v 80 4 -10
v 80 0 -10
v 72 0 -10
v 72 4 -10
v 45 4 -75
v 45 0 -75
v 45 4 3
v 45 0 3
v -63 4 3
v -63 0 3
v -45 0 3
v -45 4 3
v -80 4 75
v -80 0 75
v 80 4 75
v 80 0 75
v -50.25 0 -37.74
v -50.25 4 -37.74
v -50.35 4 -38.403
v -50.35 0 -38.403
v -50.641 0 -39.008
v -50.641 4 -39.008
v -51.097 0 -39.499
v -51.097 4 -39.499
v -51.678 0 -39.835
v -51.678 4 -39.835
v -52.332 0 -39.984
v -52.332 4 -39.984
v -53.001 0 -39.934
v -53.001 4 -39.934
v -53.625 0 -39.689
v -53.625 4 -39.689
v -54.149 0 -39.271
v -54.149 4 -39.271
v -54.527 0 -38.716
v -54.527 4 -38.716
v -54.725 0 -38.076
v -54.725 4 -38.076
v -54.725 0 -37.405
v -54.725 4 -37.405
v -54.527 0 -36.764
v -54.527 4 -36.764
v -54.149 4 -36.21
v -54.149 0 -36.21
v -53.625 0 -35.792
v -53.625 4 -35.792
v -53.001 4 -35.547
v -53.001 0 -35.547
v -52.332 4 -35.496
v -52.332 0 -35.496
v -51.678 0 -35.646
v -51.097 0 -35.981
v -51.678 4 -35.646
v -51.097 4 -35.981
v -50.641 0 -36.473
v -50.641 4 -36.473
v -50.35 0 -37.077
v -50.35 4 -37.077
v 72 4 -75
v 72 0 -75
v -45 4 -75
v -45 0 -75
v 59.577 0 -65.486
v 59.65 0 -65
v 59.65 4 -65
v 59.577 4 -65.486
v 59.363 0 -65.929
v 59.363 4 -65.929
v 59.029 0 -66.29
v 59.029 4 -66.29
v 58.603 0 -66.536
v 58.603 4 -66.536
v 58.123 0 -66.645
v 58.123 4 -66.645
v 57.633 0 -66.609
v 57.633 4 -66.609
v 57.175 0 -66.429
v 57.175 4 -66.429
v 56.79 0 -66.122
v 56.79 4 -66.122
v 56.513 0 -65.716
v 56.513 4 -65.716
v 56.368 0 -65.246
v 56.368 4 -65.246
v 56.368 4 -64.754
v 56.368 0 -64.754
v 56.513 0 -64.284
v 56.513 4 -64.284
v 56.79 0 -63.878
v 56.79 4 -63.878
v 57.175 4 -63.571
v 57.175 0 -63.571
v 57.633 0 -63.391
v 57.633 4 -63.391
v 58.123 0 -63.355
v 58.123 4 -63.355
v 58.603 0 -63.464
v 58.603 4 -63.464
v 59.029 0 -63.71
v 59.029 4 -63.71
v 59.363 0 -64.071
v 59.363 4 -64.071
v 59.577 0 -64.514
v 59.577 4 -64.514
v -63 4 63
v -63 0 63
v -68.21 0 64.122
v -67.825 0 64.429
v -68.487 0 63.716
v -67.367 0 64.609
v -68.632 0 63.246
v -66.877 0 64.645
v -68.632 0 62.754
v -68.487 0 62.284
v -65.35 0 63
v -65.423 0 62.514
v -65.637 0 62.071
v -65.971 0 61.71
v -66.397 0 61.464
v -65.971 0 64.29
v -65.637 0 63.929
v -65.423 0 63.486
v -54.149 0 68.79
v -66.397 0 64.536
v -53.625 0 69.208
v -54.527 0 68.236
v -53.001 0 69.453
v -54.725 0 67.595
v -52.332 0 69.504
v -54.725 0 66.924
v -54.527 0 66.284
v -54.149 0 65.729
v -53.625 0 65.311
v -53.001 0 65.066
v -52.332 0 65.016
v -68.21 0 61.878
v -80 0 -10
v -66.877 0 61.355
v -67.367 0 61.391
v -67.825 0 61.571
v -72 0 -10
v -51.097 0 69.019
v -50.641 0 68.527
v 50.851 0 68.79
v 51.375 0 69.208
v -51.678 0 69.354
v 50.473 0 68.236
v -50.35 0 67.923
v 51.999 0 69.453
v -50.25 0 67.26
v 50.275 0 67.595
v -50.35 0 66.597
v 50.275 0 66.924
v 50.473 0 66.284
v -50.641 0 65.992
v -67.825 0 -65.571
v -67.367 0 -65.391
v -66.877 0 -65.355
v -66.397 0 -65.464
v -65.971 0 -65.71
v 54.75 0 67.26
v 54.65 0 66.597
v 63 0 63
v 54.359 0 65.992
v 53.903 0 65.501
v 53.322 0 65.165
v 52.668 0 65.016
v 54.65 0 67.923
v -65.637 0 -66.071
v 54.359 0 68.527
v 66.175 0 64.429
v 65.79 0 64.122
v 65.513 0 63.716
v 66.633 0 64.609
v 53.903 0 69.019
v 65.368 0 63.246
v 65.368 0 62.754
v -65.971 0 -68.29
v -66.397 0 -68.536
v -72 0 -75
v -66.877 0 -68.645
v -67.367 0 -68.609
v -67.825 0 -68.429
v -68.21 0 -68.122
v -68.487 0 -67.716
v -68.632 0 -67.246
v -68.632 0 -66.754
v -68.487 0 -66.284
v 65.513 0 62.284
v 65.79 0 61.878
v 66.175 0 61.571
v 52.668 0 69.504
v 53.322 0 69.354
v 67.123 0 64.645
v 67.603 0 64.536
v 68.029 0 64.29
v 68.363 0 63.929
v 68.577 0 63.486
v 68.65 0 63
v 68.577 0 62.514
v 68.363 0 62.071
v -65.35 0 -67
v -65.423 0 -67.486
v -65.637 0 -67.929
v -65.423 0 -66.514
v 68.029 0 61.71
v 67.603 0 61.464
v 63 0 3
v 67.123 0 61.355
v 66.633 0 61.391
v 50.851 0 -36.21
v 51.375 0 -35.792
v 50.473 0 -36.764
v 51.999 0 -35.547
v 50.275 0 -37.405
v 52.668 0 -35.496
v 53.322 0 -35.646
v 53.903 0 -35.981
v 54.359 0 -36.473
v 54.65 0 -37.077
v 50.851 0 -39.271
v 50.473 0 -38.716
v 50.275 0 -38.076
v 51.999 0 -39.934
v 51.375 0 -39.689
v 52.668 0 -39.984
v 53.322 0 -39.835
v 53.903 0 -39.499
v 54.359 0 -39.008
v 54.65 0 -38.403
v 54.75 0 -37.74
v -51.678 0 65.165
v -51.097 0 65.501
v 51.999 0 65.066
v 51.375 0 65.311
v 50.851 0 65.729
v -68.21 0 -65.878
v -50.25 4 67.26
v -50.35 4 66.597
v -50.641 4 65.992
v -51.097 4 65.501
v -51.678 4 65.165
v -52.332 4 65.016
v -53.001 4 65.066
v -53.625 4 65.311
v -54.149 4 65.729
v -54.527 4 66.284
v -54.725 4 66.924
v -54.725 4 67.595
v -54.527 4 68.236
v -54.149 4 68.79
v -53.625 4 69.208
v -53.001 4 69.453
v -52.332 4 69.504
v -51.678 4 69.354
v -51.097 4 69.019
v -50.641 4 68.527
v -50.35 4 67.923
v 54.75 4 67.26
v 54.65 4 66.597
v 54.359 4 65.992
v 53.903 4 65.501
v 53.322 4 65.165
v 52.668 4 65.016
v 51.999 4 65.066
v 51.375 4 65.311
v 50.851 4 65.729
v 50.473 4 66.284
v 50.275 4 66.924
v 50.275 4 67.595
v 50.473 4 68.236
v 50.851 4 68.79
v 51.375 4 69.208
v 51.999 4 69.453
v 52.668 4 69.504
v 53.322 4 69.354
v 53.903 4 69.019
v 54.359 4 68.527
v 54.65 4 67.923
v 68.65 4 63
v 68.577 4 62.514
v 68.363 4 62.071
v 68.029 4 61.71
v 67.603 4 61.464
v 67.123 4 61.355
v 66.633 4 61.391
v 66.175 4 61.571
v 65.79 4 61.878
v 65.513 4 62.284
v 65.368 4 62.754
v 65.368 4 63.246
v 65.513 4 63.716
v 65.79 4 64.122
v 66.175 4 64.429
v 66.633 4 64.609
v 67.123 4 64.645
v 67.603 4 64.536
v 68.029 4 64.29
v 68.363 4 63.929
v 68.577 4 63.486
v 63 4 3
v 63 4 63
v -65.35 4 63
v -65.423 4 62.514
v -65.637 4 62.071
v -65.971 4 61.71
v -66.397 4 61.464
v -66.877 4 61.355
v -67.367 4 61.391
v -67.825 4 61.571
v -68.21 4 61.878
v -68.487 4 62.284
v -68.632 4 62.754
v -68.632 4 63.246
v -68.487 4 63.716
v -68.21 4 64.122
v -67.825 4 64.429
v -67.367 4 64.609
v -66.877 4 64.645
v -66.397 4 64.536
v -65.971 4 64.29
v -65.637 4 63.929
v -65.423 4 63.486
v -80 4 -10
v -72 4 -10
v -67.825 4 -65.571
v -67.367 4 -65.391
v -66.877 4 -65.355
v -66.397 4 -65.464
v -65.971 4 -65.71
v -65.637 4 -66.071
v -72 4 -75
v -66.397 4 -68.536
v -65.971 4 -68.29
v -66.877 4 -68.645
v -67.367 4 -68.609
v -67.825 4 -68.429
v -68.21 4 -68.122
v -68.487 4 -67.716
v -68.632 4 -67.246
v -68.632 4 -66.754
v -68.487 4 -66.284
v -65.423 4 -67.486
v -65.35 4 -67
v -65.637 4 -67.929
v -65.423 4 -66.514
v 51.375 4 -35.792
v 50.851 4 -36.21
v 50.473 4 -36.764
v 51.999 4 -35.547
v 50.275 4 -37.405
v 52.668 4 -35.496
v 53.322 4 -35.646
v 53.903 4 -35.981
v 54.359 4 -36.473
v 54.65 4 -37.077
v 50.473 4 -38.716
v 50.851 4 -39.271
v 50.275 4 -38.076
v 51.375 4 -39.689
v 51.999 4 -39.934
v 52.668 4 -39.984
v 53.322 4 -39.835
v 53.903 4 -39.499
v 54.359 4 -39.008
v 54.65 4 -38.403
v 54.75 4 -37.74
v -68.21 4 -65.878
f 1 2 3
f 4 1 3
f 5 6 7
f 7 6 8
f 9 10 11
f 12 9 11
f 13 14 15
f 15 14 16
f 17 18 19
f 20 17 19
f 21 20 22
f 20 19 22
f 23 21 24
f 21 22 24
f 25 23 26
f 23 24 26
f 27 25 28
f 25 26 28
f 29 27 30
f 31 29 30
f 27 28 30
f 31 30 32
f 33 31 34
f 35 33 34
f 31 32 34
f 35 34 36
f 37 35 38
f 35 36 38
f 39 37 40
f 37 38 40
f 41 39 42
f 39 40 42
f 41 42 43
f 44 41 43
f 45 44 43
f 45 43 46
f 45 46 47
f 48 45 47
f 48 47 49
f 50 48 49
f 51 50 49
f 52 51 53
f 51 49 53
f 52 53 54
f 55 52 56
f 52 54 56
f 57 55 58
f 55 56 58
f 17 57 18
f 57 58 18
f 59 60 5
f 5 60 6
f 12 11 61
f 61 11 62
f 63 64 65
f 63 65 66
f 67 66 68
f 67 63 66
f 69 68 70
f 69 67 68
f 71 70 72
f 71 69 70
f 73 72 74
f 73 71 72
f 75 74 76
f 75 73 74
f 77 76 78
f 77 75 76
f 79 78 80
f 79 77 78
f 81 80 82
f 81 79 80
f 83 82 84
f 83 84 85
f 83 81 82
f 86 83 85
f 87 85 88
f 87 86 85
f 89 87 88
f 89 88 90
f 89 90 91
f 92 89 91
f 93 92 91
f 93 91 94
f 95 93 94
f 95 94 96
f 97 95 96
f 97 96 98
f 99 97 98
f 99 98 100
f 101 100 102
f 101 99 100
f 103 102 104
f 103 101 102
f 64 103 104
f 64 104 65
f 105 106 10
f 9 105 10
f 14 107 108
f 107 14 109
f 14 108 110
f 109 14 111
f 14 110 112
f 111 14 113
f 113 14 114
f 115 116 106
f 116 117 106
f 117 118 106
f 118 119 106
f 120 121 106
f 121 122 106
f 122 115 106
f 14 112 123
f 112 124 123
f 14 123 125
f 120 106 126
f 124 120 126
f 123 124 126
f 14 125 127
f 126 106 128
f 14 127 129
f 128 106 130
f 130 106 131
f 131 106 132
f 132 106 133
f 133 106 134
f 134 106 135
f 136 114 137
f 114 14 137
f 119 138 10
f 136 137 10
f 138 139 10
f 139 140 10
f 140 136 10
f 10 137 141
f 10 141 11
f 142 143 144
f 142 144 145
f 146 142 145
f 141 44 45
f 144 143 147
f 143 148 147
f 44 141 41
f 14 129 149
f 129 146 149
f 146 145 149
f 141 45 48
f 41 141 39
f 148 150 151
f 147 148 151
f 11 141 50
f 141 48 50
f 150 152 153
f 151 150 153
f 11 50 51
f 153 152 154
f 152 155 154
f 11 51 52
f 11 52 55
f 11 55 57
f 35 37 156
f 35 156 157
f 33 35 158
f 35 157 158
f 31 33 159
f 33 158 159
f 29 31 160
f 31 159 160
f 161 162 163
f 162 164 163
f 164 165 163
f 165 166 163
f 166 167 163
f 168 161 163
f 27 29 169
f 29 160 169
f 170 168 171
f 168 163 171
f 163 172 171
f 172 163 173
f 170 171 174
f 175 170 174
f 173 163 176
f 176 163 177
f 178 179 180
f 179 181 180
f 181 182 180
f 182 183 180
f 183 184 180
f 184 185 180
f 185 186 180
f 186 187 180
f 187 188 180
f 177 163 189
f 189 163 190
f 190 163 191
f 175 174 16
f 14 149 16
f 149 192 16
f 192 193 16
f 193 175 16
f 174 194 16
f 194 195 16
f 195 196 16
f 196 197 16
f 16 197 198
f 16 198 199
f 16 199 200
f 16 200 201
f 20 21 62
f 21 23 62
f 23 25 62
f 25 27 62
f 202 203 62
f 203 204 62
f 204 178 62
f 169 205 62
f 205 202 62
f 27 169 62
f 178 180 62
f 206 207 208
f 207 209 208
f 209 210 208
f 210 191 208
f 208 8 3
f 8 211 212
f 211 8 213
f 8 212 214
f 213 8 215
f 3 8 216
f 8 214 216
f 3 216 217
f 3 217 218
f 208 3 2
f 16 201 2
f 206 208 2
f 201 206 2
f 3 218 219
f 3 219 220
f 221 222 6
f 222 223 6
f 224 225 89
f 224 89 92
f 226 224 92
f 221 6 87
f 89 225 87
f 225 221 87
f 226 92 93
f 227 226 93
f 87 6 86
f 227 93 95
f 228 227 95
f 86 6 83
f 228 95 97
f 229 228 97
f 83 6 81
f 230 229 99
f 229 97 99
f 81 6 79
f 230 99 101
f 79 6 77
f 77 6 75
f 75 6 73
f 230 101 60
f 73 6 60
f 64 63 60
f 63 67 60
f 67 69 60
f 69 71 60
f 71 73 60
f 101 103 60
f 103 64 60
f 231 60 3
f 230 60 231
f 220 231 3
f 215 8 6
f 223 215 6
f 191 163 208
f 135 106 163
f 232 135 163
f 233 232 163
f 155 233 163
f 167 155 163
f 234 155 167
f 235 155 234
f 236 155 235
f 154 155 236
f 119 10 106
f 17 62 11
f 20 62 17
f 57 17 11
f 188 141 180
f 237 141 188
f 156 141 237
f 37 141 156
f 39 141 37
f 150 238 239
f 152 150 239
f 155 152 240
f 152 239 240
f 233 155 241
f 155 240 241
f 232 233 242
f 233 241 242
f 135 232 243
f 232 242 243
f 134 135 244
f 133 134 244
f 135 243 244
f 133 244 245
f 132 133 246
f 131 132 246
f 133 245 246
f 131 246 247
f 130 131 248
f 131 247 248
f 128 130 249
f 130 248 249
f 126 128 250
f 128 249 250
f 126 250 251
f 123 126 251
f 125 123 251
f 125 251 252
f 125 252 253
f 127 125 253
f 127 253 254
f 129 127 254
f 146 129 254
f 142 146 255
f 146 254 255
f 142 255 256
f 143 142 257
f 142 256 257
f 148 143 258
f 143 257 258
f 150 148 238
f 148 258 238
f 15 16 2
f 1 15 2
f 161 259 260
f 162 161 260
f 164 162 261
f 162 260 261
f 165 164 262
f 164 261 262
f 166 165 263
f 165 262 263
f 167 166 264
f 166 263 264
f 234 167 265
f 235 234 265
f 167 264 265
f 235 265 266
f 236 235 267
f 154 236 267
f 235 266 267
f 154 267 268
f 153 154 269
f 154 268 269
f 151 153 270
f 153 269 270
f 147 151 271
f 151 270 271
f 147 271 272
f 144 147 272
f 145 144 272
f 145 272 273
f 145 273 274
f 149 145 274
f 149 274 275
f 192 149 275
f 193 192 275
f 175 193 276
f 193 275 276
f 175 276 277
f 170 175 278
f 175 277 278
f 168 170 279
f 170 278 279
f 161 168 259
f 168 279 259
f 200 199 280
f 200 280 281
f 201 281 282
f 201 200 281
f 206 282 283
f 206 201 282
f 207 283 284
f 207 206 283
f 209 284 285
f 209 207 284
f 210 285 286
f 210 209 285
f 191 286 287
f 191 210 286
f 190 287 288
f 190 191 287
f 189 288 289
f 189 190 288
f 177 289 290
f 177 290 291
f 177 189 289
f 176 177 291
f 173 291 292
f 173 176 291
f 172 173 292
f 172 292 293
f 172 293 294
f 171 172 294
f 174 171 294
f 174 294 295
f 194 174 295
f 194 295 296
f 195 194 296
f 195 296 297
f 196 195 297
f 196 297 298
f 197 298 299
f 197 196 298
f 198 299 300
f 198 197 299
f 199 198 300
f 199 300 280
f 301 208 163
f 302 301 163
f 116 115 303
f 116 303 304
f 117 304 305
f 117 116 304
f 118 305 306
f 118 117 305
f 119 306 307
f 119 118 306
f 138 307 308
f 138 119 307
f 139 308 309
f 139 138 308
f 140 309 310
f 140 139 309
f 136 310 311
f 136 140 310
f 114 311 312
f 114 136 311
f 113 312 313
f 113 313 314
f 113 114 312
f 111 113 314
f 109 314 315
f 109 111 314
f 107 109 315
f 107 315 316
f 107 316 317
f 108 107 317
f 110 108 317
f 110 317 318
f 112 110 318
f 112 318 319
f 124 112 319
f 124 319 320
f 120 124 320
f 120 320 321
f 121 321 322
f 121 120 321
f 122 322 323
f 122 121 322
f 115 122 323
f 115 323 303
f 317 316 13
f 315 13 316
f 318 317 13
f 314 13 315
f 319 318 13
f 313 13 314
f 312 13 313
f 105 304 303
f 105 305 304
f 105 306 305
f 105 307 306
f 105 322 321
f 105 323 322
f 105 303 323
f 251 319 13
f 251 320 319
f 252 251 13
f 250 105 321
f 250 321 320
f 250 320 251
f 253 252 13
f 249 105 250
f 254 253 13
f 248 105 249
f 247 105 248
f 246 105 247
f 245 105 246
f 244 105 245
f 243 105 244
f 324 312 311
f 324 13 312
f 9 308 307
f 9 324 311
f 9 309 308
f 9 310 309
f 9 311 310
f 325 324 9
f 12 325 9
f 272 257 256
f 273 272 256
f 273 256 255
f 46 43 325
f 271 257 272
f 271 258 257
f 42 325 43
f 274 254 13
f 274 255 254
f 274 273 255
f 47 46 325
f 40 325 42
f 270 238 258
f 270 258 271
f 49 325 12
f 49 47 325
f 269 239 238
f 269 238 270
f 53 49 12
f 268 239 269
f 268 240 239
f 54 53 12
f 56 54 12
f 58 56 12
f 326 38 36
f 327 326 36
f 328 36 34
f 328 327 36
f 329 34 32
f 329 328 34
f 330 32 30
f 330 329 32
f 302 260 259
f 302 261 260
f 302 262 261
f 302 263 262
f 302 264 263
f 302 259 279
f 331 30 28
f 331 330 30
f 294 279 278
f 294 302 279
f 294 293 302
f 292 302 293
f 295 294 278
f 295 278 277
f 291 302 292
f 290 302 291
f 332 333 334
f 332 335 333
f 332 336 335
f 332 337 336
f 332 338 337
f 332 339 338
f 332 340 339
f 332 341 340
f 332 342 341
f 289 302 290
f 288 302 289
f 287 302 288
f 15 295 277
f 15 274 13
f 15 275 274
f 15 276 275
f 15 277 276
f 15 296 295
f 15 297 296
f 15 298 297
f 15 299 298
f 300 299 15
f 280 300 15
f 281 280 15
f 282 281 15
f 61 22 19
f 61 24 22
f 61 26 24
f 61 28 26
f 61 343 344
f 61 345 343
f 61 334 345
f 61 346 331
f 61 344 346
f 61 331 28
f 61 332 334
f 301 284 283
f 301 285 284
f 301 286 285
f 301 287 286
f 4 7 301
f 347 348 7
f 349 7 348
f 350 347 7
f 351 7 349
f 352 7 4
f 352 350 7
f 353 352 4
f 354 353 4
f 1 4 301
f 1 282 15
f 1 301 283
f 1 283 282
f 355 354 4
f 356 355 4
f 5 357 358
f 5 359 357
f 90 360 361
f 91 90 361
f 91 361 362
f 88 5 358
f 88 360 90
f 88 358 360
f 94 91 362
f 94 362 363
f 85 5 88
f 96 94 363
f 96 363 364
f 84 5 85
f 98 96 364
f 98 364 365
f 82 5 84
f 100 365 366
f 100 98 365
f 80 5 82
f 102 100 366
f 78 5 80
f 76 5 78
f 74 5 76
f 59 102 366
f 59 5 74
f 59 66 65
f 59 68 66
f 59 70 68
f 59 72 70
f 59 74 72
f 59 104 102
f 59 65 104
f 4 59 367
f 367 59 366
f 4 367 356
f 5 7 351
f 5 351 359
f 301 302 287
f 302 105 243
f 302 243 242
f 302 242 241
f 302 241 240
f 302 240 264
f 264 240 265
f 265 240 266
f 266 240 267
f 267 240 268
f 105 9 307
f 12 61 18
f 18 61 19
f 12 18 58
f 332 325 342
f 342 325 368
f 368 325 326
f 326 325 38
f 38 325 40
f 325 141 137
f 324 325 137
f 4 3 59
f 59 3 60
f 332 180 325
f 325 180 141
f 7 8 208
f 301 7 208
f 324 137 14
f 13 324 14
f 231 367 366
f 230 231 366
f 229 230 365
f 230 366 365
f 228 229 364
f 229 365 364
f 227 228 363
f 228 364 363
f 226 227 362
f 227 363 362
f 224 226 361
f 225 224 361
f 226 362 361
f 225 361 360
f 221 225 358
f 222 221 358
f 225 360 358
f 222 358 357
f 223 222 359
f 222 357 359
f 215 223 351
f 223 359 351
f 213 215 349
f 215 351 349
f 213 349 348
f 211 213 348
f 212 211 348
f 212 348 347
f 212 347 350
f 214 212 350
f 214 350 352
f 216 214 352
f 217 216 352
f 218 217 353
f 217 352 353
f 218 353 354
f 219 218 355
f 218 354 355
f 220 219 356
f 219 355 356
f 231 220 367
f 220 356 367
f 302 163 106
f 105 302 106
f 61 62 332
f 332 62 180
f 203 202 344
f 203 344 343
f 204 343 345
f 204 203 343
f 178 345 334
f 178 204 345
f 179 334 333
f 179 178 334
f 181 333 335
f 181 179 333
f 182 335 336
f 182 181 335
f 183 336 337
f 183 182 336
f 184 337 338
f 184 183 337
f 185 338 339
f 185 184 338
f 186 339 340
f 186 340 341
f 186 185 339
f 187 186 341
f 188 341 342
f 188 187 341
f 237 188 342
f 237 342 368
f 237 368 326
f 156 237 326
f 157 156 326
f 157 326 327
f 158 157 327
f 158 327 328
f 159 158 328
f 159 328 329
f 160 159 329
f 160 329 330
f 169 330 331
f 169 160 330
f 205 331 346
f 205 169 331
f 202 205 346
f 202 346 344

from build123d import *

# Parameters (mm, degrees)
SKETCH1_R      = 1.65
EXTRUDE1_DEPTH = 4
SKETCH3_R      = 2.25
EXTRUDE3_DEPTH = 4


with BuildPart() as part:
    # Sketch1 → Extrude1 (new body)
    with BuildSketch(Plane(origin=(0, 0, 0), x_dir=(1, 0, 0), z_dir=(0, 1, 0))):
        Polygon((-80, 10), (-80, -75), (80, -75), (80, 10), (72, 10), (72, 75), (45, 75), (45, -3), (63, -3), (63, -63), (-63, -63), (-63, -3), (-45, -3), (-45, 75), (-72, 75), (-72, 10), align=None)
        with Locations((-67, -63)):
            Circle(SKETCH1_R, mode=Mode.SUBTRACT)
        with Locations((67, -63)):
            Circle(SKETCH1_R, mode=Mode.SUBTRACT)
        with Locations((-67, 67)):
            Circle(SKETCH1_R, mode=Mode.SUBTRACT)
        with Locations((58, 65)):
            Circle(SKETCH1_R, mode=Mode.SUBTRACT)
    extrude(amount=EXTRUDE1_DEPTH)

    # Sketch3 → Extrude3 (cut)
    with BuildSketch(Plane(origin=(0, 4, 0), x_dir=(1, 0, 0), z_dir=(0, 1, 0))):
        with Locations((52.5, -67.259837658)):
            Circle(SKETCH3_R)
        with Locations((-52.5, -67.259837658)):
            Circle(SKETCH3_R)
        with Locations((52.5, 37.740162342)):
            Circle(SKETCH3_R)
        with Locations((-52.5, 37.740162342)):
            Circle(SKETCH3_R)
    extrude(amount=-EXTRUDE3_DEPTH, mode=Mode.SUBTRACT)


solid = part.part
